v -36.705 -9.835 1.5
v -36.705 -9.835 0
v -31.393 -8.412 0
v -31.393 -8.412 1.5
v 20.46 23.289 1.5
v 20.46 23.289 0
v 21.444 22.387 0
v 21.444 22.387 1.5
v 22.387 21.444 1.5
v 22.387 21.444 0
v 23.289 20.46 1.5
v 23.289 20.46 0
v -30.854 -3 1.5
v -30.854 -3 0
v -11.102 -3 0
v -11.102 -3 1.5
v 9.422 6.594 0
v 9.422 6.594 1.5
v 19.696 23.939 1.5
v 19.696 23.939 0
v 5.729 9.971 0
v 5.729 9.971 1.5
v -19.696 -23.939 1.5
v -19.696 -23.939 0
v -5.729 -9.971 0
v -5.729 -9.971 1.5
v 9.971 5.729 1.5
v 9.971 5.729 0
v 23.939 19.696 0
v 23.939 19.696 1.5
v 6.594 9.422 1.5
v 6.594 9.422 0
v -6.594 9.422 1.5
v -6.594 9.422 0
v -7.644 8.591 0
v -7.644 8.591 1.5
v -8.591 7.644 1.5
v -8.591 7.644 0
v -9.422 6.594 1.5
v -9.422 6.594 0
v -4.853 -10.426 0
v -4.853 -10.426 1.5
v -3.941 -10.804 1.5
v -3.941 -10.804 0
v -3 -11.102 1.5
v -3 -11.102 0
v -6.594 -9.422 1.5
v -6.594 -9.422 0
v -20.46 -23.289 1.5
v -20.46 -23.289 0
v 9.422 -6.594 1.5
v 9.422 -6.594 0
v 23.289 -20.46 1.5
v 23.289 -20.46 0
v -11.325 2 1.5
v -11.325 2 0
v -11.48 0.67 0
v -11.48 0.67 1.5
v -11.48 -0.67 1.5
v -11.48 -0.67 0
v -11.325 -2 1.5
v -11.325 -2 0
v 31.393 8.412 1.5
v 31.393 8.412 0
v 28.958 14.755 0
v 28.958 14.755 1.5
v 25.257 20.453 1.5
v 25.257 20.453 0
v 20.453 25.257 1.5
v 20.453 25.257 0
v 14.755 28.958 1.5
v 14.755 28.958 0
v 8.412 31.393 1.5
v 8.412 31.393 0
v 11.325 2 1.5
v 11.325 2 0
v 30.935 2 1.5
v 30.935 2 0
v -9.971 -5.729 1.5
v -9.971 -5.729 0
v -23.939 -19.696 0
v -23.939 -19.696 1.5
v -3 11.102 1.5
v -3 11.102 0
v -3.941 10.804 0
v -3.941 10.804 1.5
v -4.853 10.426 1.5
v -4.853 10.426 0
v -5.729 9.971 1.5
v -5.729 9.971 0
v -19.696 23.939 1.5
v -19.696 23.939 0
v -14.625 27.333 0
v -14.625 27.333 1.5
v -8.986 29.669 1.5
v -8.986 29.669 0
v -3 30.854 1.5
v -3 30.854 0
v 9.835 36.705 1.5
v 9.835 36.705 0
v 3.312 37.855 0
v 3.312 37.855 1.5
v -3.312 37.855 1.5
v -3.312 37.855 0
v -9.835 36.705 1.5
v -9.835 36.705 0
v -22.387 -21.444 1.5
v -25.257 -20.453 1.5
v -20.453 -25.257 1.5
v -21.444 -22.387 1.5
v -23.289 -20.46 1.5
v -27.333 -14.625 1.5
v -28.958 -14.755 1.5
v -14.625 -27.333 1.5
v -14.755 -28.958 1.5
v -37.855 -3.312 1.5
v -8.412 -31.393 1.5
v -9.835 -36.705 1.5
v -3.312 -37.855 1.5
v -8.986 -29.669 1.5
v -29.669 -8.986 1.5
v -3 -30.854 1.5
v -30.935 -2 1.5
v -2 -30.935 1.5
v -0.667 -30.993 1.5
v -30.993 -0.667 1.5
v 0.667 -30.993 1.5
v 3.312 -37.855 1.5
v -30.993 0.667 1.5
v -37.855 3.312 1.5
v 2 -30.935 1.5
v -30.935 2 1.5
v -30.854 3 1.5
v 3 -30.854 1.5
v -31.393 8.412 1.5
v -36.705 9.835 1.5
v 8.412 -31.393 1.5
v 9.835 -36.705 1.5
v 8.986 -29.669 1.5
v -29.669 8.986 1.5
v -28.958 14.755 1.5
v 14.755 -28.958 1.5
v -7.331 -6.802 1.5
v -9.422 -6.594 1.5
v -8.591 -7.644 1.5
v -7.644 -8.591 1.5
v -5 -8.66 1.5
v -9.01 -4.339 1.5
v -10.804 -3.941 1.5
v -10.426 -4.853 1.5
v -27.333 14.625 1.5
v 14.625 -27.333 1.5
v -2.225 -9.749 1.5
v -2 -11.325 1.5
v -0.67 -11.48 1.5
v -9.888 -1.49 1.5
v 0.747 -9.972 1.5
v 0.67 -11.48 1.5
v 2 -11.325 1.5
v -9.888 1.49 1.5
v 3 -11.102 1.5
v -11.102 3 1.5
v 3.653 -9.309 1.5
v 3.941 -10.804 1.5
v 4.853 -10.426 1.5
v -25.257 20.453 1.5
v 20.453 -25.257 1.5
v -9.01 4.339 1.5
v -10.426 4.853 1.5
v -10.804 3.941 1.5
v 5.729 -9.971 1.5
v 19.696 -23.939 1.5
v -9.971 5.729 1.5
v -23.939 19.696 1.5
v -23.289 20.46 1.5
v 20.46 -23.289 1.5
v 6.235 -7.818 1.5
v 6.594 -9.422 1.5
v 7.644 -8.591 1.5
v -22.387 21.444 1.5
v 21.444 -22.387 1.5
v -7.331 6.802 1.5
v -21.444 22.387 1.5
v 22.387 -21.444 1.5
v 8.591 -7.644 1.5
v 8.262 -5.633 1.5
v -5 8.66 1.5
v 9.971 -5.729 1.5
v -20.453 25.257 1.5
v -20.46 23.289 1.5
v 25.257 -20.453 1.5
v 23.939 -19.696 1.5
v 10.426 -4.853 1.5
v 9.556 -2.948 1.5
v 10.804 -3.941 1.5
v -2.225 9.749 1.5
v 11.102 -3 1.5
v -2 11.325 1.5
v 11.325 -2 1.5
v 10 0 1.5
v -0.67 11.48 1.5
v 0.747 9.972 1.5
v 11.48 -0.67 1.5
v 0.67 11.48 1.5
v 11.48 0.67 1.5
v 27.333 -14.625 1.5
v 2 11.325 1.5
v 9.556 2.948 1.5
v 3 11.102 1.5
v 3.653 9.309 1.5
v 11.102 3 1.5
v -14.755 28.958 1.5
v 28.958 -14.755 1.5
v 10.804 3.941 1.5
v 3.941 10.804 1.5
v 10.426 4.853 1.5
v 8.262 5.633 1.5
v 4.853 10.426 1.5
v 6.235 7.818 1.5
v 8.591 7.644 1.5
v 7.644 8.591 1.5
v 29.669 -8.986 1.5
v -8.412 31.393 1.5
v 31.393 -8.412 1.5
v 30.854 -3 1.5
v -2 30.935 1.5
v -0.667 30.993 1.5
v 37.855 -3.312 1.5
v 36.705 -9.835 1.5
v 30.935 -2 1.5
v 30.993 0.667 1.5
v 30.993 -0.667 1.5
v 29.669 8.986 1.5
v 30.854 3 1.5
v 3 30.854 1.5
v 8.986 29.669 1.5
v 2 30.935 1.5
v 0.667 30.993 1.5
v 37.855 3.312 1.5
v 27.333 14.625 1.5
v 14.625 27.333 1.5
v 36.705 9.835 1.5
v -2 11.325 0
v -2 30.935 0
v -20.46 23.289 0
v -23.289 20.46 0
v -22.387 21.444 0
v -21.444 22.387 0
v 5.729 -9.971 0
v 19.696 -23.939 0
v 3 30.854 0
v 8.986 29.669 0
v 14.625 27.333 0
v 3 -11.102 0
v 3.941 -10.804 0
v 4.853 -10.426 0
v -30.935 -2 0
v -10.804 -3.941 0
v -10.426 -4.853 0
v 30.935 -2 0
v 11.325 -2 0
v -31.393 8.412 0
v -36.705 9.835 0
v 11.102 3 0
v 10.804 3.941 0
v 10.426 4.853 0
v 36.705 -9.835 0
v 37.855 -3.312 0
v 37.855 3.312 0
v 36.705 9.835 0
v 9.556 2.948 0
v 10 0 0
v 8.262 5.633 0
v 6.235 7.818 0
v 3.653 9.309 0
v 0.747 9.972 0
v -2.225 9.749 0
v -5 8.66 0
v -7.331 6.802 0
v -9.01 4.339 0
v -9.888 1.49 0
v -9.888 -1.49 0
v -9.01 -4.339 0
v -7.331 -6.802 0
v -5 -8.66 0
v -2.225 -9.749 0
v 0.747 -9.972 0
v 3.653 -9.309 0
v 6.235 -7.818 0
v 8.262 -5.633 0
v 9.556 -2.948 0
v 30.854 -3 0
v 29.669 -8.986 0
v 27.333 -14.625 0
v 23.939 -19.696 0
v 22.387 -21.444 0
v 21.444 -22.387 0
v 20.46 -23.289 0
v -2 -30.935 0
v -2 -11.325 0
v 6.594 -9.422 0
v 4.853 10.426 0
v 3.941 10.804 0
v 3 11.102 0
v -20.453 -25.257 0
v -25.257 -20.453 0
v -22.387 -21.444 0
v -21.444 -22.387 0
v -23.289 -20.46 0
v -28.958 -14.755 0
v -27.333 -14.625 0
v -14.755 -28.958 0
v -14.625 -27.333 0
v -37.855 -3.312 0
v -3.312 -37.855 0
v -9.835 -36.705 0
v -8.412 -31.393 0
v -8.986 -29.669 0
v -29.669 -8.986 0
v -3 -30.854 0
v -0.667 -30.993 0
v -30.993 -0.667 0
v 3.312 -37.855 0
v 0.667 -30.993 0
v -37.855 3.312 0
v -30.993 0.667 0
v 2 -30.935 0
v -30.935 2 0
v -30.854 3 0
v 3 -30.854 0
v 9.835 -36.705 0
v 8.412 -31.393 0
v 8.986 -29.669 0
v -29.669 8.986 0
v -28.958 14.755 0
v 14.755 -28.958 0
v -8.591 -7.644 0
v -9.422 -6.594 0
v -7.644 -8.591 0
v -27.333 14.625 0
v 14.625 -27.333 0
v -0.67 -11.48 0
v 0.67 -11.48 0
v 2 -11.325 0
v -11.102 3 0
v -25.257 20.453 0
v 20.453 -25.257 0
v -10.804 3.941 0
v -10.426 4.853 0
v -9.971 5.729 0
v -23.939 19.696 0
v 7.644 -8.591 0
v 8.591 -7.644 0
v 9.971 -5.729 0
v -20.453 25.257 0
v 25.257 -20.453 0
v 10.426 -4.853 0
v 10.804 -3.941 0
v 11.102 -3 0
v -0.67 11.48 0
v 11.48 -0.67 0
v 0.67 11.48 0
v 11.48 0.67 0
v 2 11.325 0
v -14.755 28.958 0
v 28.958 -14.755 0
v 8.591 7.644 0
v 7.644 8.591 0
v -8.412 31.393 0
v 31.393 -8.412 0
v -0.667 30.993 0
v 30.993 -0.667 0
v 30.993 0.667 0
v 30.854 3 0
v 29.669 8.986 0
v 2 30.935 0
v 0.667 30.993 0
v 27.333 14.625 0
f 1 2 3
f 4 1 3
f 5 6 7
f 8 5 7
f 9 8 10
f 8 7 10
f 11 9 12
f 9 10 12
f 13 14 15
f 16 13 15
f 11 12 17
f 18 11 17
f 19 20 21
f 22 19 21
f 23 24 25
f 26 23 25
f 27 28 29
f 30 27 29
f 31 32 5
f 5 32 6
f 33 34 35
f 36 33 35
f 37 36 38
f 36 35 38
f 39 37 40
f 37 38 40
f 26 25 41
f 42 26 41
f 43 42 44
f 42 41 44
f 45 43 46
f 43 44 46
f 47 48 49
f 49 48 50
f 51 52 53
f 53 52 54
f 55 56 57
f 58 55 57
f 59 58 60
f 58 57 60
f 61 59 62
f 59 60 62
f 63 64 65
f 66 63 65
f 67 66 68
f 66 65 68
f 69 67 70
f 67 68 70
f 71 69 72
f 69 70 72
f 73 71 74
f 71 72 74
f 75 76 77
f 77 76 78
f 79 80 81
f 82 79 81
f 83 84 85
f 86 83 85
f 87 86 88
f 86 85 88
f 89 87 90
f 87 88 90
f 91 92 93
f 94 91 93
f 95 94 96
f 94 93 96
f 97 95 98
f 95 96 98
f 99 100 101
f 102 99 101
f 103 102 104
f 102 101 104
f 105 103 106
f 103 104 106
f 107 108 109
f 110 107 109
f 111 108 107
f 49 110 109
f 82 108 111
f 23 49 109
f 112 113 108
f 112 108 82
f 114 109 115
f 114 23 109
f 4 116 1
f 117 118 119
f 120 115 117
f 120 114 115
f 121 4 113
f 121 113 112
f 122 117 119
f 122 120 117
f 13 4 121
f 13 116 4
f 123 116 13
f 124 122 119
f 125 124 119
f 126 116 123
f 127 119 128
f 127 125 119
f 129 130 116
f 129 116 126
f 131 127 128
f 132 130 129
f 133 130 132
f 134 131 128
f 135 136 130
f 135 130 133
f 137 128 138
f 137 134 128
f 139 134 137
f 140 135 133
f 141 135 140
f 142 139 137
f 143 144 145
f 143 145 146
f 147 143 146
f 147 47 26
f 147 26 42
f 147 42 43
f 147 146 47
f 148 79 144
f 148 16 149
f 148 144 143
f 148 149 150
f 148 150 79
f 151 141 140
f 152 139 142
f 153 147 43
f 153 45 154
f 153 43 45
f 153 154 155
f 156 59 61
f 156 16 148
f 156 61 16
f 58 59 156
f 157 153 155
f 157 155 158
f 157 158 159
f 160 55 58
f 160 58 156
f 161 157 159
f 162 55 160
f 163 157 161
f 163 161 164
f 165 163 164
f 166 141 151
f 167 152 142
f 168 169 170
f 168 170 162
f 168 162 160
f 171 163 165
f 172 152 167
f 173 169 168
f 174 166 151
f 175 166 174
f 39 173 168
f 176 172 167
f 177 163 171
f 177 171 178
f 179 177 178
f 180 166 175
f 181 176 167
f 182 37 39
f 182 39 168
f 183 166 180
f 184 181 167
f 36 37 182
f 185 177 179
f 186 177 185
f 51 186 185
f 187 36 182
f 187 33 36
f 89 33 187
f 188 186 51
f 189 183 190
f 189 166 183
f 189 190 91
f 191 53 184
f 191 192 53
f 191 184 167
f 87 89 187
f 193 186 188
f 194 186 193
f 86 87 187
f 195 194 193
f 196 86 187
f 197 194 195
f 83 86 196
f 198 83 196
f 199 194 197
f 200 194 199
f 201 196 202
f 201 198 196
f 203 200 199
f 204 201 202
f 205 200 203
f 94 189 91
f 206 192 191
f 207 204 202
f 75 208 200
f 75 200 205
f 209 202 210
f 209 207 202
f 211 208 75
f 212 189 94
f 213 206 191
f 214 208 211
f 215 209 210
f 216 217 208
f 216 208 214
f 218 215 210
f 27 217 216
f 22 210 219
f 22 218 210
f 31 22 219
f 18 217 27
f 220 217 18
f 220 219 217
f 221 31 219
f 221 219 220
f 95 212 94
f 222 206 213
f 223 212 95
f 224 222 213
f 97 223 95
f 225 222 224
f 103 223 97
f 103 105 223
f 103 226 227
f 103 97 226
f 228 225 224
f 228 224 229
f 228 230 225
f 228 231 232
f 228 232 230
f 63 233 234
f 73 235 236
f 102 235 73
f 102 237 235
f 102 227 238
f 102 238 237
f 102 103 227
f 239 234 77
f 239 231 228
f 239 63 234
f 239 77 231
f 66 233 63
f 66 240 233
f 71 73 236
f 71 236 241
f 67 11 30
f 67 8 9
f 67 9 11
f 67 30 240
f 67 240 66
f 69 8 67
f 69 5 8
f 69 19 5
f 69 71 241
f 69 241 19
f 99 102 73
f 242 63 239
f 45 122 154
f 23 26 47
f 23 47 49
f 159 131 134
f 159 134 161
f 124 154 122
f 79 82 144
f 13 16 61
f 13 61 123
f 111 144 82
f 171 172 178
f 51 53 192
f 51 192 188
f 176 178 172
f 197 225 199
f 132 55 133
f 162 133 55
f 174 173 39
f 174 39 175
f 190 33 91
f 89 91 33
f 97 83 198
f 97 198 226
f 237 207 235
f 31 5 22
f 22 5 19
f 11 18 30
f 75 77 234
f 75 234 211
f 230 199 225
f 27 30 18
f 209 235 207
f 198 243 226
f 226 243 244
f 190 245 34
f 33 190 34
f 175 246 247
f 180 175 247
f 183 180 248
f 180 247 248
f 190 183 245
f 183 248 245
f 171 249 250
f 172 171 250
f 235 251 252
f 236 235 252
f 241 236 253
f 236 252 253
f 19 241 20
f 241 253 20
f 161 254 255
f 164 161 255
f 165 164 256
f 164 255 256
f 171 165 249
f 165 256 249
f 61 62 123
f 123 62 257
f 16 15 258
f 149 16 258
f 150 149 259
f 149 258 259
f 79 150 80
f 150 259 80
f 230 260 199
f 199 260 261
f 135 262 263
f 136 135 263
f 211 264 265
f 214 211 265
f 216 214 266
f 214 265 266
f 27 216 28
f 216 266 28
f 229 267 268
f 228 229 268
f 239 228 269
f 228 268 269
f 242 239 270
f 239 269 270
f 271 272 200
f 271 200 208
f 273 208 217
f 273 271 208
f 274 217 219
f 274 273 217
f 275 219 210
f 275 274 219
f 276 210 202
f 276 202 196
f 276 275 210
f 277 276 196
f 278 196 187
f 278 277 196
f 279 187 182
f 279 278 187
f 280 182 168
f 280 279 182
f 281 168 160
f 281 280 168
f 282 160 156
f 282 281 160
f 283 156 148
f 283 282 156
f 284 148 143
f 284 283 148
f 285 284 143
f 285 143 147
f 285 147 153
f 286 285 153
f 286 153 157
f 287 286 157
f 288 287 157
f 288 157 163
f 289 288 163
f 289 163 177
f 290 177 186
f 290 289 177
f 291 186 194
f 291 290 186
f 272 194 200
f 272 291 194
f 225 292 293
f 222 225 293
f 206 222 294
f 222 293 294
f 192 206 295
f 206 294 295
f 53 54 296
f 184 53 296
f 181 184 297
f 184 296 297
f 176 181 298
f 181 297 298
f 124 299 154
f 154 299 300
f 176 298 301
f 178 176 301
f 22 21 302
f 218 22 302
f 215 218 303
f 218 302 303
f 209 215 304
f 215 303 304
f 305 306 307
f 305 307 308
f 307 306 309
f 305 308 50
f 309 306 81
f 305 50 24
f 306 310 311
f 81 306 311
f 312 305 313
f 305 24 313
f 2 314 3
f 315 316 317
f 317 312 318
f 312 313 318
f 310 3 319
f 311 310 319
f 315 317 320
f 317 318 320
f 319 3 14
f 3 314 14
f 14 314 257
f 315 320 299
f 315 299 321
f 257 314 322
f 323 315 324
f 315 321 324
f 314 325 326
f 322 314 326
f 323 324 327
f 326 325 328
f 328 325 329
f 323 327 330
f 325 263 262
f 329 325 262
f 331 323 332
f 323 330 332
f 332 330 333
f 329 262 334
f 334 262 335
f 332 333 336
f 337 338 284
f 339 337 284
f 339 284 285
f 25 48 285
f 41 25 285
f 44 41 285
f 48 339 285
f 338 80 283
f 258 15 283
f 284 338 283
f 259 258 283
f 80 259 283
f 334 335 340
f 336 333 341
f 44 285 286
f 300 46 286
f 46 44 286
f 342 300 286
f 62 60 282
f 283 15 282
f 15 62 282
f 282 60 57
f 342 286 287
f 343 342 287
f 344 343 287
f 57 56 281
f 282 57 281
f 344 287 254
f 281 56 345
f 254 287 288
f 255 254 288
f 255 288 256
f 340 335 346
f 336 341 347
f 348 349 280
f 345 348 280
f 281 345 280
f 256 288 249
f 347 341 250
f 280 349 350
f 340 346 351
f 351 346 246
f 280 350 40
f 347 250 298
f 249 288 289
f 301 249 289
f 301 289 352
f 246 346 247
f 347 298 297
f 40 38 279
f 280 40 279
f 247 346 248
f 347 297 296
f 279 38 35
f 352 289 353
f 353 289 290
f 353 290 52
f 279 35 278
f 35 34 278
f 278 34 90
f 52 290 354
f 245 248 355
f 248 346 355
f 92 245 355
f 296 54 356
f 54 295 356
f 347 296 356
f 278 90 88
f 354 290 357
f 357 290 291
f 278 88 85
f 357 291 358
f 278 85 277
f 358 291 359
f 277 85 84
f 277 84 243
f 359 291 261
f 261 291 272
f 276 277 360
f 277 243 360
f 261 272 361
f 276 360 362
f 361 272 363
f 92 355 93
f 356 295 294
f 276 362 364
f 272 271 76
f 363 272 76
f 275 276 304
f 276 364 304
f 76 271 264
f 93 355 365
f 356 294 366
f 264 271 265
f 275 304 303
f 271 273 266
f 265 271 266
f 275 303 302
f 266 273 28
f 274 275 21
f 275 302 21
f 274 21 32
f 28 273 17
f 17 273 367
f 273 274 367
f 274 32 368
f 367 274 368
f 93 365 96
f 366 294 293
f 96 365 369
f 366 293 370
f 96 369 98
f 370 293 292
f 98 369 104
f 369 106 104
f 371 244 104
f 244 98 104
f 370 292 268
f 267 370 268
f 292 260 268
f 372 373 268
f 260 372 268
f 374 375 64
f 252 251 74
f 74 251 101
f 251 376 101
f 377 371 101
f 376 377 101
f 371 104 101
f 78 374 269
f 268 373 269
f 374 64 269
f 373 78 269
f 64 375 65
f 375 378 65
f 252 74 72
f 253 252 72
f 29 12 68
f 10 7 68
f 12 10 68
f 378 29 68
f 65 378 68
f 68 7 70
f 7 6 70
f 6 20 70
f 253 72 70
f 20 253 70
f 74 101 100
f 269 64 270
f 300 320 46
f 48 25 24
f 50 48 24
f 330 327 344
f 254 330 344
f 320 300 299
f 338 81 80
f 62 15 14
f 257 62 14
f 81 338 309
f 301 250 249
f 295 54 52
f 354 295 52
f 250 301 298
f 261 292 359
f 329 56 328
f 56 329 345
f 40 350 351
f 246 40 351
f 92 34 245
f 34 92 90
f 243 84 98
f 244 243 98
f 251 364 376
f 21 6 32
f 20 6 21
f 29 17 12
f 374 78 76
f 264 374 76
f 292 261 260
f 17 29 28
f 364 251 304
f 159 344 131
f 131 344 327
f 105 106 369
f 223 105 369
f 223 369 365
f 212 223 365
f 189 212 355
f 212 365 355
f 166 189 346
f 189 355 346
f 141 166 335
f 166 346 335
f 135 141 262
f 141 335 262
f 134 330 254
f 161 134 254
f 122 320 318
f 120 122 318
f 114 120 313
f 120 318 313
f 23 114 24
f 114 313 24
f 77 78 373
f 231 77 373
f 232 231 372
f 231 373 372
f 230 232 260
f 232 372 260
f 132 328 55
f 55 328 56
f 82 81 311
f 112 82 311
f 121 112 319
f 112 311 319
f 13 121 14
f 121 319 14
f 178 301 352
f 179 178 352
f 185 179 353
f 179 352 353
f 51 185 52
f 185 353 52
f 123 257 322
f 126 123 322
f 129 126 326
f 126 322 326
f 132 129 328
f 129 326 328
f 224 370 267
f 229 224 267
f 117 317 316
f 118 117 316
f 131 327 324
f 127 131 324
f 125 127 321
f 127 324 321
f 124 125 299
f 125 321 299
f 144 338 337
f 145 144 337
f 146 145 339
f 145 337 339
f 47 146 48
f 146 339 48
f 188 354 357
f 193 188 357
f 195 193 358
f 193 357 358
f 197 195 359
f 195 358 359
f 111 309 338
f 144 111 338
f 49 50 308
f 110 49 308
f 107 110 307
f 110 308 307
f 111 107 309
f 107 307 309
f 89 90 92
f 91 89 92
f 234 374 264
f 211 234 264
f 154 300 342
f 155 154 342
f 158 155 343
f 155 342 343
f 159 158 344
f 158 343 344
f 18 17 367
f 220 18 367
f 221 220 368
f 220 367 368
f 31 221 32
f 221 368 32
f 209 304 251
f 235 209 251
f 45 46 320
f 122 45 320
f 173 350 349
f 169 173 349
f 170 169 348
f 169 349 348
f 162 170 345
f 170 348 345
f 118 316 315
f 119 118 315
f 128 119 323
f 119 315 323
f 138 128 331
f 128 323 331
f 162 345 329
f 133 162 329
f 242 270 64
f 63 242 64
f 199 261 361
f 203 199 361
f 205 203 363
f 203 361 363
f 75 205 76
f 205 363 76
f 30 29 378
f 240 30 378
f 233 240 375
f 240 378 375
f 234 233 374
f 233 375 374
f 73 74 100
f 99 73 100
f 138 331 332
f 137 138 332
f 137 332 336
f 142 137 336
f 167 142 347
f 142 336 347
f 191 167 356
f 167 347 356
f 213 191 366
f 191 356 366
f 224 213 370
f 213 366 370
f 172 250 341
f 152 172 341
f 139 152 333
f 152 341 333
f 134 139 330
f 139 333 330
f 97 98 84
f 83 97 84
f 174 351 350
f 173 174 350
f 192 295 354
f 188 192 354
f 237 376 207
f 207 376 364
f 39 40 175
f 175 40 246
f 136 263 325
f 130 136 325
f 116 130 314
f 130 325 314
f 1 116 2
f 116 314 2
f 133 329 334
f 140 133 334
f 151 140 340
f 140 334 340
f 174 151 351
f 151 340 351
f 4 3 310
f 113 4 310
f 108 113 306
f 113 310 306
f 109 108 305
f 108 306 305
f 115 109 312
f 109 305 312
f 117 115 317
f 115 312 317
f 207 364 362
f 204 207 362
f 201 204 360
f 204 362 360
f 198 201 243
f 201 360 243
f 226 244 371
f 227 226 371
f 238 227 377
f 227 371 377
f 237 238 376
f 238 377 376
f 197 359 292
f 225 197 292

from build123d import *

# Parameters (mm, degrees)
F0_R     = 10
F1_DEPTH = 1.5


with BuildPart() as f1:
    # F0 (on Top) → F1 (new body)
    with BuildSketch(Plane.XY):
        with BuildLine():
            Line((-31.392589, 8.411619), (-36.705181, 9.835124))
            ThreePointArc((-36.705181, 9.835124), (-38, 0), (-36.705181, -9.835124))
            Line((-36.705181, -9.835124), (-31.392589, -8.411619))
            ThreePointArc((-31.392589, -8.411619), (-22.98097, -22.98097), (-8.411619, -31.392589))
            Line((-8.411619, -31.392589), (-9.835124, -36.705181))
            ThreePointArc((-9.835124, -36.705181), (0, -38), (9.835124, -36.705181))
            Line((9.835124, -36.705181), (8.411619, -31.392589))
            ThreePointArc((8.411619, -31.392589), (22.98097, -22.98097), (31.392589, -8.411619))
            Line((31.392589, -8.411619), (36.705181, -9.835124))
            ThreePointArc((36.705181, -9.835124), (38, 0), (36.705181, 9.835124))
            Line((36.705181, 9.835124), (31.392589, 8.411619))
            ThreePointArc((31.392589, 8.411619), (22.98097, 22.98097), (8.411619, 31.392589))
            Line((8.411619, 31.392589), (9.835124, 36.705181))
            ThreePointArc((9.835124, 36.705181), (0, 38), (-9.835124, 36.705181))
            Line((-9.835124, 36.705181), (-8.411619, 31.392589))
            ThreePointArc((-8.411619, 31.392589), (-22.98097, 22.98097), (-31.392589, 8.411619))
        make_face()
        with BuildLine():
            Line((-3, -11.101802), (-3, -30.854497))
            ThreePointArc((-3, -30.854497), (-11.863186, -28.640266), (-19.696104, -23.938745))
            Line((-19.696104, -23.938745), (-5.728839, -9.97148))
            ThreePointArc((-5.728839, -9.97148), (-4.400859, -10.624615), (-3, -11.101802))
        make_face(mode=Mode.SUBTRACT)
        with BuildLine():
            ThreePointArc((-23.938745, -19.696104), (-28.640266, -11.863186), (-30.854497, -3))
            Line((-30.854497, -3), (-11.101802, -3))
            ThreePointArc((-11.101802, -3), (-10.624615, -4.400859), (-9.97148, -5.728839))
            Line((-9.97148, -5.728839), (-23.938745, -19.696104))
        make_face(mode=Mode.SUBTRACT)
        with BuildLine():
            ThreePointArc((-20.460429, -23.288856), (-21.92031, -21.92031), (-23.288856, -20.460429))
            Line((-23.288856, -20.460429), (-9.422022, -6.593595))
            ThreePointArc((-9.422022, -6.593595), (-8.131728, -8.131728), (-6.593595, -9.422022))
            Line((-6.593595, -9.422022), (-20.460429, -23.288856))
        make_face(mode=Mode.SUBTRACT)
        with BuildLine():
            ThreePointArc((2, -30.935417), (0, -31), (-2, -30.935417))
            Line((-2, -30.935417), (-2, -11.324752))
            ThreePointArc((-2, -11.324752), (0, -11.5), (2, -11.324752))
            Line((2, -11.324752), (2, -30.935417))
        make_face(mode=Mode.SUBTRACT)
        with BuildLine():
            ThreePointArc((19.696104, -23.938745), (11.863186, -28.640266), (3, -30.854497))
            Line((3, -30.854497), (3, -11.101802))
            ThreePointArc((3, -11.101802), (4.400859, -10.624615), (5.728839, -9.97148))
            Line((5.728839, -9.97148), (19.696104, -23.938745))
        make_face(mode=Mode.SUBTRACT)
        with BuildLine():
            ThreePointArc((23.288856, -20.460429), (21.92031, -21.92031), (20.460429, -23.288856))
            Line((20.460429, -23.288856), (6.593595, -9.422022))
            ThreePointArc((6.593595, -9.422022), (8.131728, -8.131728), (9.422022, -6.593595))
            Line((9.422022, -6.593595), (23.288856, -20.460429))
        make_face(mode=Mode.SUBTRACT)
        with BuildLine():
            Line((11.101802, -3), (30.854497, -3))
            ThreePointArc((30.854497, -3), (28.640266, -11.863186), (23.938745, -19.696104))
            Line((23.938745, -19.696104), (9.97148, -5.728839))
            ThreePointArc((9.97148, -5.728839), (10.624615, -4.400859), (11.101802, -3))
        make_face(mode=Mode.SUBTRACT)
        with BuildLine():
            ThreePointArc((-30.935417, -2), (-31, 0), (-30.935417, 2))
            Line((-30.935417, 2), (-11.324752, 2))
            ThreePointArc((-11.324752, 2), (-11.5, 0), (-11.324752, -2))
            Line((-11.324752, -2), (-30.935417, -2))
        make_face(mode=Mode.SUBTRACT)
        with BuildLine():
            Line((-11.101802, 3), (-30.854497, 3))
            ThreePointArc((-30.854497, 3), (-28.640266, 11.863186), (-23.938745, 19.696104))
            Line((-23.938745, 19.696104), (-9.97148, 5.728839))
            ThreePointArc((-9.97148, 5.728839), (-10.624615, 4.400859), (-11.101802, 3))
        make_face(mode=Mode.SUBTRACT)
        with BuildLine():
            ThreePointArc((-23.288856, 20.460429), (-21.92031, 21.92031), (-20.460429, 23.288856))
            Line((-20.460429, 23.288856), (-6.593595, 9.422022))
            ThreePointArc((-6.593595, 9.422022), (-8.131728, 8.131728), (-9.422022, 6.593595))
            Line((-9.422022, 6.593595), (-23.288856, 20.460429))
        make_face(mode=Mode.SUBTRACT)
        with BuildLine():
            ThreePointArc((-19.696104, 23.938745), (-11.863186, 28.640266), (-3, 30.854497))
            Line((-3, 30.854497), (-3, 11.101802))
            ThreePointArc((-3, 11.101802), (-4.400859, 10.624615), (-5.728839, 9.97148))
            Line((-5.728839, 9.97148), (-19.696104, 23.938745))
        make_face(mode=Mode.SUBTRACT)
        Circle(F0_R, mode=Mode.SUBTRACT)
        with BuildLine():
            ThreePointArc((20.460429, 23.288856), (21.92031, 21.92031), (23.288856, 20.460429))
            Line((23.288856, 20.460429), (9.422022, 6.593595))
            ThreePointArc((9.422022, 6.593595), (8.131728, 8.131728), (6.593595, 9.422022))
            Line((6.593595, 9.422022), (20.460429, 23.288856))
        make_face(mode=Mode.SUBTRACT)
        with BuildLine():
            ThreePointArc((30.935417, 2), (31, 0), (30.935417, -2))
            Line((30.935417, -2), (11.324752, -2))
            ThreePointArc((11.324752, -2), (11.5, 0), (11.324752, 2))
            Line((11.324752, 2), (30.935417, 2))
        make_face(mode=Mode.SUBTRACT)
        with BuildLine():
            ThreePointArc((23.938745, 19.696104), (28.640266, 11.863186), (30.854497, 3))
            Line((30.854497, 3), (11.101802, 3))
            ThreePointArc((11.101802, 3), (10.624615, 4.400859), (9.97148, 5.728839))
            Line((9.97148, 5.728839), (23.938745, 19.696104))
        make_face(mode=Mode.SUBTRACT)
        with BuildLine():
            Line((2, 30.935417), (2, 11.324752))
            ThreePointArc((2, 11.324752), (0, 11.5), (-2, 11.324752))
            Line((-2, 11.324752), (-2, 30.935417))
            ThreePointArc((-2, 30.935417), (0, 31), (2, 30.935417))
        make_face(mode=Mode.SUBTRACT)
        with BuildLine():
            Line((3, 11.101802), (3, 30.854497))
            ThreePointArc((3, 30.854497), (11.863186, 28.640266), (19.696104, 23.938745))
            Line((19.696104, 23.938745), (5.728839, 9.97148))
            ThreePointArc((5.728839, 9.97148), (4.400859, 10.624615), (3, 11.101802))
        make_face(mode=Mode.SUBTRACT)
    extrude(amount=F1_DEPTH)


solid = f1.part
